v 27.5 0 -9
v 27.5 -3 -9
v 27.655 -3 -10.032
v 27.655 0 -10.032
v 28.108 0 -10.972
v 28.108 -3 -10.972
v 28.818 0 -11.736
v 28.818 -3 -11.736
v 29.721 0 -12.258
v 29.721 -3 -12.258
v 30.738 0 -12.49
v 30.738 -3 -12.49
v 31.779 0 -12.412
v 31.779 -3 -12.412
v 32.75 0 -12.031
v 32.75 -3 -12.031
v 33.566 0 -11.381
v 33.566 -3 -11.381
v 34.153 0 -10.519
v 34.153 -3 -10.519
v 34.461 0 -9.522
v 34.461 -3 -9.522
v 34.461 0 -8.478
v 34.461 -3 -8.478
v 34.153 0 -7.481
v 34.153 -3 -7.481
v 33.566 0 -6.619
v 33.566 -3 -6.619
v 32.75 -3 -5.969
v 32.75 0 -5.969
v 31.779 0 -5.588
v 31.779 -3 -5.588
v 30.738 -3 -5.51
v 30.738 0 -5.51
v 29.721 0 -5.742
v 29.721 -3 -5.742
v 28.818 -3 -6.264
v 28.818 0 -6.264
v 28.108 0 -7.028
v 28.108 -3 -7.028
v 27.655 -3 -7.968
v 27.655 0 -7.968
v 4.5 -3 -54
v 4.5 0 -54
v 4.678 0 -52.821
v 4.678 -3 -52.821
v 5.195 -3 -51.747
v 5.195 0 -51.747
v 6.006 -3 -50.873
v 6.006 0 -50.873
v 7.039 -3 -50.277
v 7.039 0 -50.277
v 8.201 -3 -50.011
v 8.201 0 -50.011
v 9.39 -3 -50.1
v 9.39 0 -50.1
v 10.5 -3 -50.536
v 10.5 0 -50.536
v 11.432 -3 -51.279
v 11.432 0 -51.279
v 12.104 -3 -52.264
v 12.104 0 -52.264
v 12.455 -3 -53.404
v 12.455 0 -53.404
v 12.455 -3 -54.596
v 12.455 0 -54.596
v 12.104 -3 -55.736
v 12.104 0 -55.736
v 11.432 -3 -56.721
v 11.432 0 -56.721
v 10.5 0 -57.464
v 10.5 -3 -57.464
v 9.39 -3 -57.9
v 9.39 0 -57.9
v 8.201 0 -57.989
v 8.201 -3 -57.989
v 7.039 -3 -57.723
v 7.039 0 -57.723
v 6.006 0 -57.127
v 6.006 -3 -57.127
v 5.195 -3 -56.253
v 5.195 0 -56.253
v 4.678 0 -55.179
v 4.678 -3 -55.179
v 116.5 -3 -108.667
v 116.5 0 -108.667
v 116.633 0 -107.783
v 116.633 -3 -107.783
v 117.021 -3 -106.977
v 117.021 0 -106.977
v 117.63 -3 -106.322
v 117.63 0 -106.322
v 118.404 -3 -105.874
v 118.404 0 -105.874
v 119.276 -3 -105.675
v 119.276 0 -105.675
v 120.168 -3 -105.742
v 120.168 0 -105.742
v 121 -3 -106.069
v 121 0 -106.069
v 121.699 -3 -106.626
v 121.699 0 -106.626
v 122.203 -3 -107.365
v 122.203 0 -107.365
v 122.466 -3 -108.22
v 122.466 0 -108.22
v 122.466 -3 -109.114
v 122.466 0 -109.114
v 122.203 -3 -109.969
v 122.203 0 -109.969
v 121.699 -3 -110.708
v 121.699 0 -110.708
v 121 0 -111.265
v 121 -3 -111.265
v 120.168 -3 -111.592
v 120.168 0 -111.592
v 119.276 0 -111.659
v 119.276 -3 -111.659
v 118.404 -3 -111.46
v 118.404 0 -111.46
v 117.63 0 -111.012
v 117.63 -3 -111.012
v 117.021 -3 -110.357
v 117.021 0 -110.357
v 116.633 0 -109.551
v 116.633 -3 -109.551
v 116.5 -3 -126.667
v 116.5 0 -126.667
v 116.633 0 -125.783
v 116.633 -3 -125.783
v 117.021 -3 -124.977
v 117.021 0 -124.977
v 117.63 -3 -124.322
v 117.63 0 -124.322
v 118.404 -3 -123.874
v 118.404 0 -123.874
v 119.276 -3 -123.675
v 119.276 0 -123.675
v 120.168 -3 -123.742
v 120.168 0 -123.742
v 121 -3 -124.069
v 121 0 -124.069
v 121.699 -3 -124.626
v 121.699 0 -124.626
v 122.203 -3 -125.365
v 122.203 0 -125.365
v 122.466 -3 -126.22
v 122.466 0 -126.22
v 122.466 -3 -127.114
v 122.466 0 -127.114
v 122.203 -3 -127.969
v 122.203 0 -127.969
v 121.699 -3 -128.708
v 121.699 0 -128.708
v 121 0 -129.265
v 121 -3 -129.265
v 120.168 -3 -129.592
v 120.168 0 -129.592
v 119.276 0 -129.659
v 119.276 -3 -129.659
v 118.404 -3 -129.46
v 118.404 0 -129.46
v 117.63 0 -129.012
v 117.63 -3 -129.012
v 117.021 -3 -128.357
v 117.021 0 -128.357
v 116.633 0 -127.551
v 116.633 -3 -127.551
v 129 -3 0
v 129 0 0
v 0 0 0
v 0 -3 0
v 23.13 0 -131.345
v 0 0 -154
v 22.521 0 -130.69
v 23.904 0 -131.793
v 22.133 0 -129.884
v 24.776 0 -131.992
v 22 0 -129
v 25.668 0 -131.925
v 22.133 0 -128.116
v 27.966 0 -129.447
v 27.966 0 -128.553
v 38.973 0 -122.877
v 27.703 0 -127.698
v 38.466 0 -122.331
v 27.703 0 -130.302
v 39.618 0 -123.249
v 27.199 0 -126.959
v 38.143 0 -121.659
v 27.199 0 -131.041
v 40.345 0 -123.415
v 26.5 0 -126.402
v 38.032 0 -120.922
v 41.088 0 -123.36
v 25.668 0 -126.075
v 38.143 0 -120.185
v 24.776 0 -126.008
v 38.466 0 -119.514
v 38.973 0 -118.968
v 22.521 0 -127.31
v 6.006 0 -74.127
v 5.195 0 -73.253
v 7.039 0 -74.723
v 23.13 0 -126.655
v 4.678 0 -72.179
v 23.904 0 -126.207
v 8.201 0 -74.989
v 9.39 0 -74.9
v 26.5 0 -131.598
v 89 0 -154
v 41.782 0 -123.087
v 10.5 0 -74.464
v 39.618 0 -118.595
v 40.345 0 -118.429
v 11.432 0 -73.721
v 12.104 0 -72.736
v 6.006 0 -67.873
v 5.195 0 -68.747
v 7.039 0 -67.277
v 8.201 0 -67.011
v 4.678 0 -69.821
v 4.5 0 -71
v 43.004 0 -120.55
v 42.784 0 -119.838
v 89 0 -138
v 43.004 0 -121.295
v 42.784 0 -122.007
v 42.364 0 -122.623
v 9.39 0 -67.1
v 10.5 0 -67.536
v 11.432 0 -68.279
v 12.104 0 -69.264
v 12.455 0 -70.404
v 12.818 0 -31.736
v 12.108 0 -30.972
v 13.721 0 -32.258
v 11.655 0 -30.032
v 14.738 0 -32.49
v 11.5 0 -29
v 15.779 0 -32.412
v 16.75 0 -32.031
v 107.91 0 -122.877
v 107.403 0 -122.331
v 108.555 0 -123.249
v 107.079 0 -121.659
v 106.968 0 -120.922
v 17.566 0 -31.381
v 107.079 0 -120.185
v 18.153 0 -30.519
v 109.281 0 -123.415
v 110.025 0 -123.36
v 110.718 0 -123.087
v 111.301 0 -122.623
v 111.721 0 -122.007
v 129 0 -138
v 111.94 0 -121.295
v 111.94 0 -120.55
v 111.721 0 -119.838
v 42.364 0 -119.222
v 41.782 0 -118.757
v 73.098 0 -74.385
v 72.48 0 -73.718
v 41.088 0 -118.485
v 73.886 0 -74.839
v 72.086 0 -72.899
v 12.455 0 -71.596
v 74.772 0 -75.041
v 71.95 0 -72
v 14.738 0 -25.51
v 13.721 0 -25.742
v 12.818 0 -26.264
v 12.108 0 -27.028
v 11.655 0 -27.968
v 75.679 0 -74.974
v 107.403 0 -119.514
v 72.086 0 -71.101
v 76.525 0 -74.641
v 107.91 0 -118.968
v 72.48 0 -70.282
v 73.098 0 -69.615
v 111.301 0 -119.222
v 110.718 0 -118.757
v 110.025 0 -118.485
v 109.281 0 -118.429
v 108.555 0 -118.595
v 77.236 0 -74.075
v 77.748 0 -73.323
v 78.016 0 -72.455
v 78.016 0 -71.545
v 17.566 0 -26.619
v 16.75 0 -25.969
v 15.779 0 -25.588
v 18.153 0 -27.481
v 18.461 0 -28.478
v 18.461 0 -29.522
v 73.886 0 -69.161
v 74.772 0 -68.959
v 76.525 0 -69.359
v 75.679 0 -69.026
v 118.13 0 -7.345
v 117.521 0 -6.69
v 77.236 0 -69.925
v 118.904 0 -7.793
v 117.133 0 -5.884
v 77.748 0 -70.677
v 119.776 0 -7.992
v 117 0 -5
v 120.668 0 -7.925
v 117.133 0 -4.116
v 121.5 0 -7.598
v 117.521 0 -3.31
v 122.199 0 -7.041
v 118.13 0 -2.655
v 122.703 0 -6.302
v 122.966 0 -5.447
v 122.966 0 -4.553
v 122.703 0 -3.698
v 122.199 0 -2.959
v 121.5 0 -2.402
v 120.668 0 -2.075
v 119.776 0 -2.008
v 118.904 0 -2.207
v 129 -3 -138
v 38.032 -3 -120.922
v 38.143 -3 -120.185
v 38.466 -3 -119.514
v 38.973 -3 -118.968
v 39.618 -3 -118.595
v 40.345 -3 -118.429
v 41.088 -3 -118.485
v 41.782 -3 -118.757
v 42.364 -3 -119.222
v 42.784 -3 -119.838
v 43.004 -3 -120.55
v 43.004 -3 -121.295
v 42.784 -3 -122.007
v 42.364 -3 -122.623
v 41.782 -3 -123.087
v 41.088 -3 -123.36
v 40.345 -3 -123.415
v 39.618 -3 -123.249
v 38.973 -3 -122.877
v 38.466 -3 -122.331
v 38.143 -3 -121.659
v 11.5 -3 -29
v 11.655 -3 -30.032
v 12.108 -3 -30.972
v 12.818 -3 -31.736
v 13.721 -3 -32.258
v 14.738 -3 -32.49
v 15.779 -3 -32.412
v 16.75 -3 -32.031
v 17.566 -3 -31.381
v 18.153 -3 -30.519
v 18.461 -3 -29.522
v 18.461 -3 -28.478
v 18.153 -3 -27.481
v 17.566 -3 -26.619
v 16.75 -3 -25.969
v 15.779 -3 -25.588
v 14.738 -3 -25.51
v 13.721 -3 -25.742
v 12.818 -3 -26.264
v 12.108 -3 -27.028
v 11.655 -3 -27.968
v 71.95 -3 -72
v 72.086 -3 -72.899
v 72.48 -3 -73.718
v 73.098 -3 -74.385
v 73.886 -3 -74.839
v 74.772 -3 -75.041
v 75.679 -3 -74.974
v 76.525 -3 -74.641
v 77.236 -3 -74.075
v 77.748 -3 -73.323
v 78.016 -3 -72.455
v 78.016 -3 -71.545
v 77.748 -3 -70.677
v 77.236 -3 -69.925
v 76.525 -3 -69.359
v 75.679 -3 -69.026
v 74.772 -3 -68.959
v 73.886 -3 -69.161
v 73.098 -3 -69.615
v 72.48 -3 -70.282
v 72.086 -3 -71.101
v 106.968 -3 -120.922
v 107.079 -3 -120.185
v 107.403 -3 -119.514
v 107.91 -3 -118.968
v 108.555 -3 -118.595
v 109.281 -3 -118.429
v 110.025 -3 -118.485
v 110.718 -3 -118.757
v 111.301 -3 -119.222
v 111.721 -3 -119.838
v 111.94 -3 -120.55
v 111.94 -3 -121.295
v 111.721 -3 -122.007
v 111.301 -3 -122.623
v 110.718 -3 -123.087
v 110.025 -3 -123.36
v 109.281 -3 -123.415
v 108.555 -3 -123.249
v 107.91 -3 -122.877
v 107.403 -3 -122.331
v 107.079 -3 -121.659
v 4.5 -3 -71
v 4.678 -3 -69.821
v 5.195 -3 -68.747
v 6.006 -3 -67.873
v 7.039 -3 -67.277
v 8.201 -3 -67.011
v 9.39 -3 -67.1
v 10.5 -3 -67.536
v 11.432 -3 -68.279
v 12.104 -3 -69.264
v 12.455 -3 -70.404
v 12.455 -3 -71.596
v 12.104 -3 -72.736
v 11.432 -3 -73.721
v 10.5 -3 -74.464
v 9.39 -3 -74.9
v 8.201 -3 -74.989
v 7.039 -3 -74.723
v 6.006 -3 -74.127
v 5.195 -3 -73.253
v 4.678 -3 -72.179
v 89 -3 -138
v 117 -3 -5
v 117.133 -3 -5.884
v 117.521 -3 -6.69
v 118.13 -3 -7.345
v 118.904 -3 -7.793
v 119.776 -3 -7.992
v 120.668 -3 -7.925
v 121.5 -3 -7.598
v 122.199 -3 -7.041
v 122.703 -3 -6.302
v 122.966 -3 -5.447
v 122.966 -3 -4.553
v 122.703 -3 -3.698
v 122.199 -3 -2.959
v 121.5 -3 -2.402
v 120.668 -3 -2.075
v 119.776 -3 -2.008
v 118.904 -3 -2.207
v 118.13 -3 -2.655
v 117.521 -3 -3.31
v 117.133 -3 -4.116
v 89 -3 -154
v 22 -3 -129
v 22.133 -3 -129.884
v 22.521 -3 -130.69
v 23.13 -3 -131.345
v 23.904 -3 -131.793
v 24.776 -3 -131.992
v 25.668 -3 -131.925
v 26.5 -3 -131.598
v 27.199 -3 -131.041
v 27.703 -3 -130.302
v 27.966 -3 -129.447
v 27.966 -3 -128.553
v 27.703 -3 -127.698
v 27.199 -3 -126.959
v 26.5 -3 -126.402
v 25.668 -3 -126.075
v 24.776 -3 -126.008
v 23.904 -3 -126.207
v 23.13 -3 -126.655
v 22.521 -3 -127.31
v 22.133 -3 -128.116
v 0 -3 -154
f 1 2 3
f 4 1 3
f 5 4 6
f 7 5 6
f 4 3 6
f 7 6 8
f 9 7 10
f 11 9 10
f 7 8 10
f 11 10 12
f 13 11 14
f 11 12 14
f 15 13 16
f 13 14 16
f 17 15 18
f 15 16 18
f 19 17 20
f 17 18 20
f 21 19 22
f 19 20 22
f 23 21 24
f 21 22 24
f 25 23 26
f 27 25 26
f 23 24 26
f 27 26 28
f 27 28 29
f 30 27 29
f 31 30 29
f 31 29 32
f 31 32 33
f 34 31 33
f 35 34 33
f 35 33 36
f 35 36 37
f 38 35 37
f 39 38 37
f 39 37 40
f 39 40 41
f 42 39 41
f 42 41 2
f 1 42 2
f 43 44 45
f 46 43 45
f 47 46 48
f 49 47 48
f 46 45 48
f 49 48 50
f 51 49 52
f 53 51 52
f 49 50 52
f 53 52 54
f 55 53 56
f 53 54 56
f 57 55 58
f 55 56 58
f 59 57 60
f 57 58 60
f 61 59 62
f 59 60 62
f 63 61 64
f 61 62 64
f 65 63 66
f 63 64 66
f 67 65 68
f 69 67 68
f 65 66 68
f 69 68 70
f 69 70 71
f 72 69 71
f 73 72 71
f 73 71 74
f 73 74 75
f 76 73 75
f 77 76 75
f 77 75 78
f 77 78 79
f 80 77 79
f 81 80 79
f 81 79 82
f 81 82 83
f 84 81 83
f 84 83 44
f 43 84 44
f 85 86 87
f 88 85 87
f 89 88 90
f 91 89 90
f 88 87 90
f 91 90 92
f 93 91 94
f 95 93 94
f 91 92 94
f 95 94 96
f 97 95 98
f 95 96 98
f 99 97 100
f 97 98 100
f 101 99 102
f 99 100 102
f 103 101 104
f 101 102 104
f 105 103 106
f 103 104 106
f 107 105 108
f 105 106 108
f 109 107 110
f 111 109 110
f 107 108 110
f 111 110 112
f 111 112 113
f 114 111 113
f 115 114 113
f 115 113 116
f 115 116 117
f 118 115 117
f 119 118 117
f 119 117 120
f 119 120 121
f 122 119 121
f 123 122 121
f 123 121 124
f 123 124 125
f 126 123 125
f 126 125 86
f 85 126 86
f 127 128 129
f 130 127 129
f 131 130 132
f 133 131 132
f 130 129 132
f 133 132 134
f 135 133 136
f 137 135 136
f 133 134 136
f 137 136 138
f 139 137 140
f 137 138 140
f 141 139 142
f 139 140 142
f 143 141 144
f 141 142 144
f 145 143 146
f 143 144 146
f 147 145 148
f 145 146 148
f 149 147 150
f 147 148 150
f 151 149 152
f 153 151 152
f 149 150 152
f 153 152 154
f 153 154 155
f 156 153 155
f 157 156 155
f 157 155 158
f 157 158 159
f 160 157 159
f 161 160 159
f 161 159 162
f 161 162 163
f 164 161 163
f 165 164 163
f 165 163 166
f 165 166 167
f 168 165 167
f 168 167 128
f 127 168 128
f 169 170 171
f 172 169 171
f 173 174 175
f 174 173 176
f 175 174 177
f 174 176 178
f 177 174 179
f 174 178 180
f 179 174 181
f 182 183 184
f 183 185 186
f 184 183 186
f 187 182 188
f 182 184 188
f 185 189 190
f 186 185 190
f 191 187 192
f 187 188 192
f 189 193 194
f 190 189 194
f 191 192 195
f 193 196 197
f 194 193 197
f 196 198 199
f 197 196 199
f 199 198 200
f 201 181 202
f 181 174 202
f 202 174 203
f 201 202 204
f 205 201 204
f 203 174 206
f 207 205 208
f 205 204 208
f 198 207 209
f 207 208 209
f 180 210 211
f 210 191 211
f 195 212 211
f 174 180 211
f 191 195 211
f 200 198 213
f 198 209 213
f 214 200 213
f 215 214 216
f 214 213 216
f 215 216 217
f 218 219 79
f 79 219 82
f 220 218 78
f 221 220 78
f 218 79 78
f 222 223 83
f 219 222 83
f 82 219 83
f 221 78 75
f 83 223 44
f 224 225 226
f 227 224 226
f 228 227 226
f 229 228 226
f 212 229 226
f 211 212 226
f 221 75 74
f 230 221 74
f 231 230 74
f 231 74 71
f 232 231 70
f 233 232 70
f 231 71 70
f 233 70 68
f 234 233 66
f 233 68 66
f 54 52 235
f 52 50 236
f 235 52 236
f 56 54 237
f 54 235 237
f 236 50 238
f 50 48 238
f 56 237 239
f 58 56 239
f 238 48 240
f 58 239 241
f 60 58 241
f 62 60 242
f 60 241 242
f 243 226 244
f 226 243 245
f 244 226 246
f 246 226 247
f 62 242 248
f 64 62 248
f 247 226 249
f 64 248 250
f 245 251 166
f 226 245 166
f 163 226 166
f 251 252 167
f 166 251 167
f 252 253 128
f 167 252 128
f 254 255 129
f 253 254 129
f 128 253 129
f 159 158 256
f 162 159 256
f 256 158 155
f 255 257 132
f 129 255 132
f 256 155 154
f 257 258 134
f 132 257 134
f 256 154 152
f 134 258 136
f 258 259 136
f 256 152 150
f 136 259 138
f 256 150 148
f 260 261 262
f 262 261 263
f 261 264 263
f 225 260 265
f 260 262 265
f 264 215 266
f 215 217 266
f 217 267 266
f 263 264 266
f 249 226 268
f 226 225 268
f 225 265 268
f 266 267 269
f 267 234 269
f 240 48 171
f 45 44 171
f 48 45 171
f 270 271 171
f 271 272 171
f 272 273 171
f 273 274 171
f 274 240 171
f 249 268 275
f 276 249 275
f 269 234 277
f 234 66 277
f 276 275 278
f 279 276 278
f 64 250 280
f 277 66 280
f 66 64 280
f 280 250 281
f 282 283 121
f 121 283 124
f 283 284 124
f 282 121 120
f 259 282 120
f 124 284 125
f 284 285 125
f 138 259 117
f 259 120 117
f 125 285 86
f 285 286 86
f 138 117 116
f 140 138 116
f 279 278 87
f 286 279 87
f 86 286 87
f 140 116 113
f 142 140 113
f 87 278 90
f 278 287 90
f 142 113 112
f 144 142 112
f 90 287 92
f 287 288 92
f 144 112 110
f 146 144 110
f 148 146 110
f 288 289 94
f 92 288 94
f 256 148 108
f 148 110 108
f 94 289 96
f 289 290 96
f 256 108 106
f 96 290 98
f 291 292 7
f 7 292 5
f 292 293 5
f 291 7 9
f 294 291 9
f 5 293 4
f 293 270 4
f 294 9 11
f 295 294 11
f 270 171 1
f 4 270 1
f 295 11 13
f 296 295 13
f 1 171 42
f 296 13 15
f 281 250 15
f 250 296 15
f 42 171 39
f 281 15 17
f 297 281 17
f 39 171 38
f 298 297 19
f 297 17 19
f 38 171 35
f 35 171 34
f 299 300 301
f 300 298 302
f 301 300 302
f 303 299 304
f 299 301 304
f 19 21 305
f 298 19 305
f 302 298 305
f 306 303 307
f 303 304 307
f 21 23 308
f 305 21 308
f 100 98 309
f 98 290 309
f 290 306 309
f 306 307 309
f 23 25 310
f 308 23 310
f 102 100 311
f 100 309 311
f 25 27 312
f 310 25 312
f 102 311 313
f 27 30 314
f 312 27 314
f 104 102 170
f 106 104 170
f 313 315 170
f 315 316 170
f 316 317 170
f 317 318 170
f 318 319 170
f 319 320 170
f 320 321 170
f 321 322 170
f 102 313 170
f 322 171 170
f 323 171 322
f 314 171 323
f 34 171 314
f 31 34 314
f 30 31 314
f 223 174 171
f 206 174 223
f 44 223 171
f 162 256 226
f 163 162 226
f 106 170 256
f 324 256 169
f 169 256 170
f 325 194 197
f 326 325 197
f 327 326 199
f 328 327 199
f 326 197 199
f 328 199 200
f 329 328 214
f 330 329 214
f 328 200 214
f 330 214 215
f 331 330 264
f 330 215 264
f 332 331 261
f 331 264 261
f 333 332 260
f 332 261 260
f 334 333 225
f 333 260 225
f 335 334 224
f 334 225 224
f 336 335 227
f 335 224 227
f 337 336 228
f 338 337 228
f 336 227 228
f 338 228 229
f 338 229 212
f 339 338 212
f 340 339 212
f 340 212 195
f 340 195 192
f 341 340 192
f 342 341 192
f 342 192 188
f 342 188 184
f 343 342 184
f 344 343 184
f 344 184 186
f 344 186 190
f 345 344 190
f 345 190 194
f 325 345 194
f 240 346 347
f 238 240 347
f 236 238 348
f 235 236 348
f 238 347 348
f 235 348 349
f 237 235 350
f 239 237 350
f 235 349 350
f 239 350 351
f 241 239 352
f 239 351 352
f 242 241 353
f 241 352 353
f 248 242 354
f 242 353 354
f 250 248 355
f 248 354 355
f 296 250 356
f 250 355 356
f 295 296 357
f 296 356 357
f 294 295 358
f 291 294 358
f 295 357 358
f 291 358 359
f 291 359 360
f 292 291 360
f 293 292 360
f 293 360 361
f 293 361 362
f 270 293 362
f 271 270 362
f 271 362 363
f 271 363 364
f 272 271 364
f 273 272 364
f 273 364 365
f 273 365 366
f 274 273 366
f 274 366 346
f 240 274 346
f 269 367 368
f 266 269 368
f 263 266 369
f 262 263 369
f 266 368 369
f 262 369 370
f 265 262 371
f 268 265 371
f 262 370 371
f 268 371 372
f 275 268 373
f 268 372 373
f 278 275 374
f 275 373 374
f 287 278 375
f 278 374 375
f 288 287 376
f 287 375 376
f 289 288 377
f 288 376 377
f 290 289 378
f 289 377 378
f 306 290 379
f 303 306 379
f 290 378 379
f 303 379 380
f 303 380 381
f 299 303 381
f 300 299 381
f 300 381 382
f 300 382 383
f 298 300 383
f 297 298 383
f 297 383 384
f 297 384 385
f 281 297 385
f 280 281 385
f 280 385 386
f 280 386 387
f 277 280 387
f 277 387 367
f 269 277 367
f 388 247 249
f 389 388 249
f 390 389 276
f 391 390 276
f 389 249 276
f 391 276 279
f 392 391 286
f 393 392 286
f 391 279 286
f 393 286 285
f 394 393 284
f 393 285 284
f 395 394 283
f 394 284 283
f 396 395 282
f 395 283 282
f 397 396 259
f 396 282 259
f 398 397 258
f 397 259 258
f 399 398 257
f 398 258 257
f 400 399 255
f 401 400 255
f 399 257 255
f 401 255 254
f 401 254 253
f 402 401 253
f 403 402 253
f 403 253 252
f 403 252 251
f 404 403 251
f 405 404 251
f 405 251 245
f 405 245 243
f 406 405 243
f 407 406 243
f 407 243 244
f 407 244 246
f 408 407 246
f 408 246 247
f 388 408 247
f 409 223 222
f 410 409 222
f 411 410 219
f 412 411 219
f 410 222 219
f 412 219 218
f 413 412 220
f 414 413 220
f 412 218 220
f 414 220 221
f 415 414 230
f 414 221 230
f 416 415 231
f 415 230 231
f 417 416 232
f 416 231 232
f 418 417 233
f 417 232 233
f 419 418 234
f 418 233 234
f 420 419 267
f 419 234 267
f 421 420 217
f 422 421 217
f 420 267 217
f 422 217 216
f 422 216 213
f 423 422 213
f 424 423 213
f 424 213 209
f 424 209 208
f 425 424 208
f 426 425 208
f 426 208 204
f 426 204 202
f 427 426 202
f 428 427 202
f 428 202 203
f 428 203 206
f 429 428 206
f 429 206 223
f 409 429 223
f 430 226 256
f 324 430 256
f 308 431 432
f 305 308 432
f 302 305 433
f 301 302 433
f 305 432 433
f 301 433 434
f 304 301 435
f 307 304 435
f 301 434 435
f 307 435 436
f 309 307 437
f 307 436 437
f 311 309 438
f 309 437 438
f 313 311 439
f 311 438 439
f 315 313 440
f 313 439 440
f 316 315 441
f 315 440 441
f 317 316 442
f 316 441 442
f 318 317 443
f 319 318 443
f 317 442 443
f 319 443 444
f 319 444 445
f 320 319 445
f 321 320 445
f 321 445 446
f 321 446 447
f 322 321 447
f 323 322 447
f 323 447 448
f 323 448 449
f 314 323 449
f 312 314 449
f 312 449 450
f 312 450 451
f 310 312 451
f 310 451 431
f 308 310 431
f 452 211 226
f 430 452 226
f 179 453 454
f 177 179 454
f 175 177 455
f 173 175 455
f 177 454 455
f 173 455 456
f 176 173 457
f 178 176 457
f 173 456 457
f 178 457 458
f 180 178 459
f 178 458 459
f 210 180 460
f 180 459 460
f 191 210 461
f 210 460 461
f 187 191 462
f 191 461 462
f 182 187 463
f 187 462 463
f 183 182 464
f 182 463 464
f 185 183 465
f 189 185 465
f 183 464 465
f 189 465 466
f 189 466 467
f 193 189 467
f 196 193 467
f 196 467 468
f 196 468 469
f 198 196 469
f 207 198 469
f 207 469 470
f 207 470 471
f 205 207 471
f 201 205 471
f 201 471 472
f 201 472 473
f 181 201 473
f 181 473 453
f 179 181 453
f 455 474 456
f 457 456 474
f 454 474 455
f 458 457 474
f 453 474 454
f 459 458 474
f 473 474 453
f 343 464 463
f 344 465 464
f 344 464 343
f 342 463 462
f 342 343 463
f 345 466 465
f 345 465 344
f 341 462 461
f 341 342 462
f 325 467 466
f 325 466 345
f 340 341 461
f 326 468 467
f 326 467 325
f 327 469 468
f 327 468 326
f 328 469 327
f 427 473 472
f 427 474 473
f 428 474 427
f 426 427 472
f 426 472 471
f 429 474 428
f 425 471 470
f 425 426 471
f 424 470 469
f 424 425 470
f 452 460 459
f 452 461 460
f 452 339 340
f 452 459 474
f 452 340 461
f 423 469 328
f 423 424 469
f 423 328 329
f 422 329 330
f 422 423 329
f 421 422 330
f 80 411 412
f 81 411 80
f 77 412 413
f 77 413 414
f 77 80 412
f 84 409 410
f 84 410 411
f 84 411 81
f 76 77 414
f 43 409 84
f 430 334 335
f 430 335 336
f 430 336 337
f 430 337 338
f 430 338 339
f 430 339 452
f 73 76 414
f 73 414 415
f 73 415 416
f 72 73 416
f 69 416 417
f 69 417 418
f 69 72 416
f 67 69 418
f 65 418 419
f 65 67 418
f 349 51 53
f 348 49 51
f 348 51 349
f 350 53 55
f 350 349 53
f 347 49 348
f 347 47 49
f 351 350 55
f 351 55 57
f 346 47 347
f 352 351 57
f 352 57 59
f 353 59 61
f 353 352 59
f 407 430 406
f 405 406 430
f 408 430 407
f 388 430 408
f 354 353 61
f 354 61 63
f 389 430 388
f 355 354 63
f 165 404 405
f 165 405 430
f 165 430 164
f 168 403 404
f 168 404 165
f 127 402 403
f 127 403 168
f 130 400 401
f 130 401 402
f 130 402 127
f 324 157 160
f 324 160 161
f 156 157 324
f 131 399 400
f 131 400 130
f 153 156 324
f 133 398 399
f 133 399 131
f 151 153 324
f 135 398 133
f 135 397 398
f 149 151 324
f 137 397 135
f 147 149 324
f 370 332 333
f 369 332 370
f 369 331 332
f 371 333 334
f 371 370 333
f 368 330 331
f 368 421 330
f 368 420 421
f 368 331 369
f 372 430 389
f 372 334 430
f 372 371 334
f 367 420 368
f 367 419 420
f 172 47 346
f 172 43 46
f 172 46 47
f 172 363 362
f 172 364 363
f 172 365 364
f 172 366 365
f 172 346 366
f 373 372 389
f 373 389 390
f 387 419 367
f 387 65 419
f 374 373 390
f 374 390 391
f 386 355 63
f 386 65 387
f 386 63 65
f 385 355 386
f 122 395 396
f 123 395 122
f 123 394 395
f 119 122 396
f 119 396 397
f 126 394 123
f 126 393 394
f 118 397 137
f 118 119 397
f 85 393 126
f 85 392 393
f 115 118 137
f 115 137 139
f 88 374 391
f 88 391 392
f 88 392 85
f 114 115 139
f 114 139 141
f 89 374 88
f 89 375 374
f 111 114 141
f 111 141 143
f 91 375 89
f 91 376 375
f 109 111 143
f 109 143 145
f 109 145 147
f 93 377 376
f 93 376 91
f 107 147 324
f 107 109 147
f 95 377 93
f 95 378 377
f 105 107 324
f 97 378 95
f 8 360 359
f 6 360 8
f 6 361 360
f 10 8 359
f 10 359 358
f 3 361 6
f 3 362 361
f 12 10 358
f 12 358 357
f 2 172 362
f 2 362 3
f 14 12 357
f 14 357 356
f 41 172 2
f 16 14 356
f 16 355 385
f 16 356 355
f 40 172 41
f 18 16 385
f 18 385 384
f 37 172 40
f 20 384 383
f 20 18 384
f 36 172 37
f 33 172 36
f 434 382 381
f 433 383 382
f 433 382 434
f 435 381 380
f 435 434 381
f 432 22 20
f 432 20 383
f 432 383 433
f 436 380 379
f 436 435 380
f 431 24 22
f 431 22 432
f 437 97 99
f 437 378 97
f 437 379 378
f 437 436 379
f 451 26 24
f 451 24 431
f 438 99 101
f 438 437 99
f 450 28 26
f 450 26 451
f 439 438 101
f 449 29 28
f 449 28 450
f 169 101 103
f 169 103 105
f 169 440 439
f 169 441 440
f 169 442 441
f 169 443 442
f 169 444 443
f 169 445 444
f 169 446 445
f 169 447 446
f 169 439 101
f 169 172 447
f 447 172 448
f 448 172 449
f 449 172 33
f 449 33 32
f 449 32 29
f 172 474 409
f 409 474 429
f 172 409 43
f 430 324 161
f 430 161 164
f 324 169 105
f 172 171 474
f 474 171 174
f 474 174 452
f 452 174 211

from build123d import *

# Parameters (mm, degrees)
F1_DEPTH = 3
F2_D     = 7
F3_D     = 6.1
F4_D     = 6
F6_D     = 5
F7_D     = 8
F8_D     = 6


with BuildPart() as f1:
    # F0 (on Front) → F1 (new body)
    with BuildSketch(Plane.XZ):
        Polygon((129, 0), (0, 0), (0, -154), (89, -154), (89, -138), (129, -138), align=None)
    extrude(amount=F1_DEPTH)

    # F2 (through all)
    with Locations(Plane(origin=(0, 0, 0), x_dir=(1, 0, 0), z_dir=(0, 1, 0))):
        with Locations((15, 29), (31, 9)):
            Hole(F2_D / 2)

    # F3 (through all)
    with Locations(Plane(origin=(0, 0, 0), x_dir=(1, 0, 0), z_dir=(0, 1, 0))):
        with Locations((75, 72)):
            Hole(F3_D / 2)

    # F4 (through all)
    with Locations(Plane(origin=(0, 0, 0), x_dir=(1, 0, 0), z_dir=(0, 1, 0))):
        with Locations((120, 5), (25, 129)):
            Hole(F4_D / 2)

    # F6 (through all)
    with Locations(Plane.XZ.offset(3)):
        with Locations((40.5317286446, -120.9223137817), (109.4682713554, -120.9223137817)):
            Hole(F6_D / 2)

    # F7 (through all)
    with Locations(Plane.XZ.offset(3)):
        with Locations((8.5, -71), (8.5, -54)):
            Hole(F7_D / 2)

    # F8 (through all)
    with Locations(Plane.XZ.offset(3)):
        with Locations((119.5, -108.667), (119.5, -126.667)):
            Hole(F8_D / 2)


solid = f1.part
